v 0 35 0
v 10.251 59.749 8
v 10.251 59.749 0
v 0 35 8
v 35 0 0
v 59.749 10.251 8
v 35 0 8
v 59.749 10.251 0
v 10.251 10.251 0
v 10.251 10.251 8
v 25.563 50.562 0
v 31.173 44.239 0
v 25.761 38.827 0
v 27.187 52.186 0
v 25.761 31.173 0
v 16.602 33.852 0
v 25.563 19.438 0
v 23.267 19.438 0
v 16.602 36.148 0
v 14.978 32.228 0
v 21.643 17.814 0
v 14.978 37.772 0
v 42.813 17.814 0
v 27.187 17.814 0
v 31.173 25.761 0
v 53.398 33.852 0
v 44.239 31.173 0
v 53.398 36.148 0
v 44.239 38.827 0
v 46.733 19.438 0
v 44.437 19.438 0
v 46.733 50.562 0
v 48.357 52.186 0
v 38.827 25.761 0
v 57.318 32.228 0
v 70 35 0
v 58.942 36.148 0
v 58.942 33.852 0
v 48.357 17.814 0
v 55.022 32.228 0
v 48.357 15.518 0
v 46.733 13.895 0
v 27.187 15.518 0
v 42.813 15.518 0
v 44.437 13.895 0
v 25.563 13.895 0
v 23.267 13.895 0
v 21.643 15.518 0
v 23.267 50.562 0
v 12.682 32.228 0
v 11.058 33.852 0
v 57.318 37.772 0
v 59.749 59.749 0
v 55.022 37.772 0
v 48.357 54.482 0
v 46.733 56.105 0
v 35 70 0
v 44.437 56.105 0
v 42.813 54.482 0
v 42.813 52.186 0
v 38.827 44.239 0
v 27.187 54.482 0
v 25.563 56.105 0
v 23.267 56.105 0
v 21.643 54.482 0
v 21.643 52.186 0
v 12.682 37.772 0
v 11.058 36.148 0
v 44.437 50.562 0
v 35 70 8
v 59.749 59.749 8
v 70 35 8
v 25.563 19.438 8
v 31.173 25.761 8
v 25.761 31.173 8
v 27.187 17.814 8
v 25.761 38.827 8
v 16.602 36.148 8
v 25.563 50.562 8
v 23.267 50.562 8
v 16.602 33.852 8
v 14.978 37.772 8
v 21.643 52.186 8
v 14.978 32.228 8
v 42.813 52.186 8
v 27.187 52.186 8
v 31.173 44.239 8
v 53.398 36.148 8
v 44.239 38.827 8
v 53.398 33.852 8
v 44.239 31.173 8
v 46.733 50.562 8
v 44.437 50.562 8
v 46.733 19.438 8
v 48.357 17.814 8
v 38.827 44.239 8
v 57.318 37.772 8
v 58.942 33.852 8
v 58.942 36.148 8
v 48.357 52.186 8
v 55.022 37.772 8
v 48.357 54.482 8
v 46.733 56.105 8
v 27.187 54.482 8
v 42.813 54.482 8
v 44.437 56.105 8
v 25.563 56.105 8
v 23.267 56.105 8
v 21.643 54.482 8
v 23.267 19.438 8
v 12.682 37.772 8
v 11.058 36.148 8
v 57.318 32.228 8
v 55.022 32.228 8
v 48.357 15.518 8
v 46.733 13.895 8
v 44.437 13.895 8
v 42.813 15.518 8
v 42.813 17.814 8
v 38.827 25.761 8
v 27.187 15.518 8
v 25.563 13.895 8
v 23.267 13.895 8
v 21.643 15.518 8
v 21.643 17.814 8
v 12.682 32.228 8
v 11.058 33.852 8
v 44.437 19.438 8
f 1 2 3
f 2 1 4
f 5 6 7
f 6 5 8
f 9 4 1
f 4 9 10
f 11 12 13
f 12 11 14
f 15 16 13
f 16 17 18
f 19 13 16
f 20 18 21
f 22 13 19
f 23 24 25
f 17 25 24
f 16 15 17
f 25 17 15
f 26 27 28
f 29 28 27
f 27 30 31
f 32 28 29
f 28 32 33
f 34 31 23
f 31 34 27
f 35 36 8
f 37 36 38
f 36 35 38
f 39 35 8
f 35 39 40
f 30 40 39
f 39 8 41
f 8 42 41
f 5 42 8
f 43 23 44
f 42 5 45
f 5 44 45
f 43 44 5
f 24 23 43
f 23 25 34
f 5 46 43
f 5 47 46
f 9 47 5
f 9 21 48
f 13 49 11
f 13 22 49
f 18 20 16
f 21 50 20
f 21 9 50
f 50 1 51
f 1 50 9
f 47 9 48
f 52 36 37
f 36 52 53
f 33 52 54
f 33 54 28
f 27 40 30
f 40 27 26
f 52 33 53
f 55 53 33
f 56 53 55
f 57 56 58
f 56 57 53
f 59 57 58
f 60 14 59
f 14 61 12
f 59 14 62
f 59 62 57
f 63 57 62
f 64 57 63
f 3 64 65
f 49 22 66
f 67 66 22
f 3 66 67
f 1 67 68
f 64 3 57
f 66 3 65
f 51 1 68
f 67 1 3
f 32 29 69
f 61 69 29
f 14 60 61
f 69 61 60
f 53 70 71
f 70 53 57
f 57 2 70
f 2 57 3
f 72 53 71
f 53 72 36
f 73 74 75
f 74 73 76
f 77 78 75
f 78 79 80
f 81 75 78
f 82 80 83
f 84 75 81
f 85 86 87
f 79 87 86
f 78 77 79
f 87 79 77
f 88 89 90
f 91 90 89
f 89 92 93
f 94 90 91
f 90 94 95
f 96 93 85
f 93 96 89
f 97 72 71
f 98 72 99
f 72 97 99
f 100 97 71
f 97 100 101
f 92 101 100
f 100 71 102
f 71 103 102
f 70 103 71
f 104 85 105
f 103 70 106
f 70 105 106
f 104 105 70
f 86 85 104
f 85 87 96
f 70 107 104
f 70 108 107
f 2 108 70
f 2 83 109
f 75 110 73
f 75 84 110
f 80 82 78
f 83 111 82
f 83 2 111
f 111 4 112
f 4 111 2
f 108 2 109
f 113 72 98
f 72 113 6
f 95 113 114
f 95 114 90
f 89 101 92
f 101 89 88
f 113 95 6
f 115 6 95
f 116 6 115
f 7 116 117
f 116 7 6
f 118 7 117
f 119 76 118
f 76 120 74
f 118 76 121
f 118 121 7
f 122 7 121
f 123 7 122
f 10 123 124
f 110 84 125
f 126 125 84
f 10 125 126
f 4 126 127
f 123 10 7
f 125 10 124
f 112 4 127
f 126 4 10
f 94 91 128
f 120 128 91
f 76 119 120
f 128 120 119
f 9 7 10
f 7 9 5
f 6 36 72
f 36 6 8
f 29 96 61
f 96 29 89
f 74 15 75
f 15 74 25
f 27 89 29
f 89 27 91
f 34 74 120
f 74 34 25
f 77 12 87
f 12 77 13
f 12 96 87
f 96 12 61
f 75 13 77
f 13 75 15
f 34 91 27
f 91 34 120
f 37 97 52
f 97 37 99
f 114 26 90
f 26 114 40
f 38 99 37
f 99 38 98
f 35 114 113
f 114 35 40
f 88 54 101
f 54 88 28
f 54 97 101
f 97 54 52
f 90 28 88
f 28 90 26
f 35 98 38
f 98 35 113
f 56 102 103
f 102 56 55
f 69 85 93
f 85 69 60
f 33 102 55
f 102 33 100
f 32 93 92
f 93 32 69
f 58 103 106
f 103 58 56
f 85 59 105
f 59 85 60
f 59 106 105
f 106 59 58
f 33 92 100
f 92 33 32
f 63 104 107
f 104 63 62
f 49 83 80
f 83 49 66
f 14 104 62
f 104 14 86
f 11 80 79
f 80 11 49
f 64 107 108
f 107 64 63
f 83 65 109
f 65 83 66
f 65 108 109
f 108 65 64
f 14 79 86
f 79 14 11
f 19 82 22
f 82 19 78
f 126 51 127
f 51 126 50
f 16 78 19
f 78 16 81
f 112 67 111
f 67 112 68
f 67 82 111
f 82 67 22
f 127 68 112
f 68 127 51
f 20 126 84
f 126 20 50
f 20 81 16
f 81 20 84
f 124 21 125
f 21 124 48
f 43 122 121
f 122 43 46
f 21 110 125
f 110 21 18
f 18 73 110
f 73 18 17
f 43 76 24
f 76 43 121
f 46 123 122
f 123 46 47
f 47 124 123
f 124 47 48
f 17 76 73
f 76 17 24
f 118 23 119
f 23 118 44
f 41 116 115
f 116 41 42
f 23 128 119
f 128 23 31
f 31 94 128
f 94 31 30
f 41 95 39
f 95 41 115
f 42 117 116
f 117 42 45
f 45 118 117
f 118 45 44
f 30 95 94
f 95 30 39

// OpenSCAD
$fn = 32;

// ----------------------------------------------------------------------
// Polygon plate: 8-gon R35, 6 bolt windows
// ----------------------------------------------------------------------

// --- parameters (mm) ---
sides = 8;                // number of polygon sides
plate_r = 35;             // circumscribed radius of the polygon
bore_r = 10;              // centre bore radius
bolts = 6;                // number of bolt windows
ring_r = 21.17;           // bolt-circle radius
bolt_r = 3;               // bolt window radius
plate_t = 8;              // plate thickness, Z (extrusion height)

plate_d = 2 * plate_r;  // circumscribed diameter
bore_d = 2 * bore_r;  // centre bore diameter
bolt_d = 2 * bolt_r;  // bolt window diameter
ring_d = 2 * ring_r;  // bolt-circle diameter

profile = [[70, 35], [59.749, 59.749], [35, 70], [10.251, 59.749], [0, 35], [10.251, 10.251], [35, 0], [59.749, 10.251]];  // primary outline, 8 points, counter clockwise
void_1 = [[44.239, 38.827], [38.827, 44.239], [31.173, 44.239], [25.761, 38.827], [25.761, 31.173], [31.173, 25.761], [38.827, 25.761], [44.239, 31.173]];  // centre bore, 8 points
void_2 = [[58.942, 36.148], [57.318, 37.772], [55.022, 37.772], [53.398, 36.148], [53.398, 33.852], [55.022, 32.228], [57.318, 32.228], [58.942, 33.852]];  // bolt window 1, 8 points
void_3 = [[48.357, 54.482], [46.733, 56.105], [44.437, 56.105], [42.813, 54.482], [42.813, 52.186], [44.437, 50.562], [46.733, 50.562], [48.357, 52.186]];  // bolt window 2, 8 points
void_4 = [[27.187, 54.482], [25.563, 56.105], [23.267, 56.105], [21.643, 54.482], [21.643, 52.186], [23.267, 50.562], [25.563, 50.562], [27.187, 52.186]];  // bolt window 3, 8 points
void_5 = [[16.602, 36.148], [14.978, 37.772], [12.682, 37.772], [11.058, 36.148], [11.058, 33.852], [12.682, 32.228], [14.978, 32.228], [16.602, 33.852]];  // bolt window 4, 8 points
void_6 = [[27.187, 17.814], [25.563, 19.438], [23.267, 19.438], [21.643, 17.814], [21.643, 15.518], [23.267, 13.895], [25.563, 13.895], [27.187, 15.518]];  // bolt window 5, 8 points
void_7 = [[48.357, 17.814], [46.733, 19.438], [44.437, 19.438], [42.813, 17.814], [42.813, 15.518], [44.437, 13.895], [46.733, 13.895], [48.357, 15.518]];  // bolt window 6, 8 points

// --- the one profile operation ---
difference() {
  linear_extrude(height = plate_t) polygon(points = profile);
  translate([0, 0, -1])
    linear_extrude(height = plate_t + 2) polygon(points = void_1);
  translate([0, 0, -1])
    linear_extrude(height = plate_t + 2) polygon(points = void_2);
  translate([0, 0, -1])
    linear_extrude(height = plate_t + 2) polygon(points = void_3);
  translate([0, 0, -1])
    linear_extrude(height = plate_t + 2) polygon(points = void_4);
  translate([0, 0, -1])
    linear_extrude(height = plate_t + 2) polygon(points = void_5);
  translate([0, 0, -1])
    linear_extrude(height = plate_t + 2) polygon(points = void_6);
  translate([0, 0, -1])
    linear_extrude(height = plate_t + 2) polygon(points = void_7);
}
